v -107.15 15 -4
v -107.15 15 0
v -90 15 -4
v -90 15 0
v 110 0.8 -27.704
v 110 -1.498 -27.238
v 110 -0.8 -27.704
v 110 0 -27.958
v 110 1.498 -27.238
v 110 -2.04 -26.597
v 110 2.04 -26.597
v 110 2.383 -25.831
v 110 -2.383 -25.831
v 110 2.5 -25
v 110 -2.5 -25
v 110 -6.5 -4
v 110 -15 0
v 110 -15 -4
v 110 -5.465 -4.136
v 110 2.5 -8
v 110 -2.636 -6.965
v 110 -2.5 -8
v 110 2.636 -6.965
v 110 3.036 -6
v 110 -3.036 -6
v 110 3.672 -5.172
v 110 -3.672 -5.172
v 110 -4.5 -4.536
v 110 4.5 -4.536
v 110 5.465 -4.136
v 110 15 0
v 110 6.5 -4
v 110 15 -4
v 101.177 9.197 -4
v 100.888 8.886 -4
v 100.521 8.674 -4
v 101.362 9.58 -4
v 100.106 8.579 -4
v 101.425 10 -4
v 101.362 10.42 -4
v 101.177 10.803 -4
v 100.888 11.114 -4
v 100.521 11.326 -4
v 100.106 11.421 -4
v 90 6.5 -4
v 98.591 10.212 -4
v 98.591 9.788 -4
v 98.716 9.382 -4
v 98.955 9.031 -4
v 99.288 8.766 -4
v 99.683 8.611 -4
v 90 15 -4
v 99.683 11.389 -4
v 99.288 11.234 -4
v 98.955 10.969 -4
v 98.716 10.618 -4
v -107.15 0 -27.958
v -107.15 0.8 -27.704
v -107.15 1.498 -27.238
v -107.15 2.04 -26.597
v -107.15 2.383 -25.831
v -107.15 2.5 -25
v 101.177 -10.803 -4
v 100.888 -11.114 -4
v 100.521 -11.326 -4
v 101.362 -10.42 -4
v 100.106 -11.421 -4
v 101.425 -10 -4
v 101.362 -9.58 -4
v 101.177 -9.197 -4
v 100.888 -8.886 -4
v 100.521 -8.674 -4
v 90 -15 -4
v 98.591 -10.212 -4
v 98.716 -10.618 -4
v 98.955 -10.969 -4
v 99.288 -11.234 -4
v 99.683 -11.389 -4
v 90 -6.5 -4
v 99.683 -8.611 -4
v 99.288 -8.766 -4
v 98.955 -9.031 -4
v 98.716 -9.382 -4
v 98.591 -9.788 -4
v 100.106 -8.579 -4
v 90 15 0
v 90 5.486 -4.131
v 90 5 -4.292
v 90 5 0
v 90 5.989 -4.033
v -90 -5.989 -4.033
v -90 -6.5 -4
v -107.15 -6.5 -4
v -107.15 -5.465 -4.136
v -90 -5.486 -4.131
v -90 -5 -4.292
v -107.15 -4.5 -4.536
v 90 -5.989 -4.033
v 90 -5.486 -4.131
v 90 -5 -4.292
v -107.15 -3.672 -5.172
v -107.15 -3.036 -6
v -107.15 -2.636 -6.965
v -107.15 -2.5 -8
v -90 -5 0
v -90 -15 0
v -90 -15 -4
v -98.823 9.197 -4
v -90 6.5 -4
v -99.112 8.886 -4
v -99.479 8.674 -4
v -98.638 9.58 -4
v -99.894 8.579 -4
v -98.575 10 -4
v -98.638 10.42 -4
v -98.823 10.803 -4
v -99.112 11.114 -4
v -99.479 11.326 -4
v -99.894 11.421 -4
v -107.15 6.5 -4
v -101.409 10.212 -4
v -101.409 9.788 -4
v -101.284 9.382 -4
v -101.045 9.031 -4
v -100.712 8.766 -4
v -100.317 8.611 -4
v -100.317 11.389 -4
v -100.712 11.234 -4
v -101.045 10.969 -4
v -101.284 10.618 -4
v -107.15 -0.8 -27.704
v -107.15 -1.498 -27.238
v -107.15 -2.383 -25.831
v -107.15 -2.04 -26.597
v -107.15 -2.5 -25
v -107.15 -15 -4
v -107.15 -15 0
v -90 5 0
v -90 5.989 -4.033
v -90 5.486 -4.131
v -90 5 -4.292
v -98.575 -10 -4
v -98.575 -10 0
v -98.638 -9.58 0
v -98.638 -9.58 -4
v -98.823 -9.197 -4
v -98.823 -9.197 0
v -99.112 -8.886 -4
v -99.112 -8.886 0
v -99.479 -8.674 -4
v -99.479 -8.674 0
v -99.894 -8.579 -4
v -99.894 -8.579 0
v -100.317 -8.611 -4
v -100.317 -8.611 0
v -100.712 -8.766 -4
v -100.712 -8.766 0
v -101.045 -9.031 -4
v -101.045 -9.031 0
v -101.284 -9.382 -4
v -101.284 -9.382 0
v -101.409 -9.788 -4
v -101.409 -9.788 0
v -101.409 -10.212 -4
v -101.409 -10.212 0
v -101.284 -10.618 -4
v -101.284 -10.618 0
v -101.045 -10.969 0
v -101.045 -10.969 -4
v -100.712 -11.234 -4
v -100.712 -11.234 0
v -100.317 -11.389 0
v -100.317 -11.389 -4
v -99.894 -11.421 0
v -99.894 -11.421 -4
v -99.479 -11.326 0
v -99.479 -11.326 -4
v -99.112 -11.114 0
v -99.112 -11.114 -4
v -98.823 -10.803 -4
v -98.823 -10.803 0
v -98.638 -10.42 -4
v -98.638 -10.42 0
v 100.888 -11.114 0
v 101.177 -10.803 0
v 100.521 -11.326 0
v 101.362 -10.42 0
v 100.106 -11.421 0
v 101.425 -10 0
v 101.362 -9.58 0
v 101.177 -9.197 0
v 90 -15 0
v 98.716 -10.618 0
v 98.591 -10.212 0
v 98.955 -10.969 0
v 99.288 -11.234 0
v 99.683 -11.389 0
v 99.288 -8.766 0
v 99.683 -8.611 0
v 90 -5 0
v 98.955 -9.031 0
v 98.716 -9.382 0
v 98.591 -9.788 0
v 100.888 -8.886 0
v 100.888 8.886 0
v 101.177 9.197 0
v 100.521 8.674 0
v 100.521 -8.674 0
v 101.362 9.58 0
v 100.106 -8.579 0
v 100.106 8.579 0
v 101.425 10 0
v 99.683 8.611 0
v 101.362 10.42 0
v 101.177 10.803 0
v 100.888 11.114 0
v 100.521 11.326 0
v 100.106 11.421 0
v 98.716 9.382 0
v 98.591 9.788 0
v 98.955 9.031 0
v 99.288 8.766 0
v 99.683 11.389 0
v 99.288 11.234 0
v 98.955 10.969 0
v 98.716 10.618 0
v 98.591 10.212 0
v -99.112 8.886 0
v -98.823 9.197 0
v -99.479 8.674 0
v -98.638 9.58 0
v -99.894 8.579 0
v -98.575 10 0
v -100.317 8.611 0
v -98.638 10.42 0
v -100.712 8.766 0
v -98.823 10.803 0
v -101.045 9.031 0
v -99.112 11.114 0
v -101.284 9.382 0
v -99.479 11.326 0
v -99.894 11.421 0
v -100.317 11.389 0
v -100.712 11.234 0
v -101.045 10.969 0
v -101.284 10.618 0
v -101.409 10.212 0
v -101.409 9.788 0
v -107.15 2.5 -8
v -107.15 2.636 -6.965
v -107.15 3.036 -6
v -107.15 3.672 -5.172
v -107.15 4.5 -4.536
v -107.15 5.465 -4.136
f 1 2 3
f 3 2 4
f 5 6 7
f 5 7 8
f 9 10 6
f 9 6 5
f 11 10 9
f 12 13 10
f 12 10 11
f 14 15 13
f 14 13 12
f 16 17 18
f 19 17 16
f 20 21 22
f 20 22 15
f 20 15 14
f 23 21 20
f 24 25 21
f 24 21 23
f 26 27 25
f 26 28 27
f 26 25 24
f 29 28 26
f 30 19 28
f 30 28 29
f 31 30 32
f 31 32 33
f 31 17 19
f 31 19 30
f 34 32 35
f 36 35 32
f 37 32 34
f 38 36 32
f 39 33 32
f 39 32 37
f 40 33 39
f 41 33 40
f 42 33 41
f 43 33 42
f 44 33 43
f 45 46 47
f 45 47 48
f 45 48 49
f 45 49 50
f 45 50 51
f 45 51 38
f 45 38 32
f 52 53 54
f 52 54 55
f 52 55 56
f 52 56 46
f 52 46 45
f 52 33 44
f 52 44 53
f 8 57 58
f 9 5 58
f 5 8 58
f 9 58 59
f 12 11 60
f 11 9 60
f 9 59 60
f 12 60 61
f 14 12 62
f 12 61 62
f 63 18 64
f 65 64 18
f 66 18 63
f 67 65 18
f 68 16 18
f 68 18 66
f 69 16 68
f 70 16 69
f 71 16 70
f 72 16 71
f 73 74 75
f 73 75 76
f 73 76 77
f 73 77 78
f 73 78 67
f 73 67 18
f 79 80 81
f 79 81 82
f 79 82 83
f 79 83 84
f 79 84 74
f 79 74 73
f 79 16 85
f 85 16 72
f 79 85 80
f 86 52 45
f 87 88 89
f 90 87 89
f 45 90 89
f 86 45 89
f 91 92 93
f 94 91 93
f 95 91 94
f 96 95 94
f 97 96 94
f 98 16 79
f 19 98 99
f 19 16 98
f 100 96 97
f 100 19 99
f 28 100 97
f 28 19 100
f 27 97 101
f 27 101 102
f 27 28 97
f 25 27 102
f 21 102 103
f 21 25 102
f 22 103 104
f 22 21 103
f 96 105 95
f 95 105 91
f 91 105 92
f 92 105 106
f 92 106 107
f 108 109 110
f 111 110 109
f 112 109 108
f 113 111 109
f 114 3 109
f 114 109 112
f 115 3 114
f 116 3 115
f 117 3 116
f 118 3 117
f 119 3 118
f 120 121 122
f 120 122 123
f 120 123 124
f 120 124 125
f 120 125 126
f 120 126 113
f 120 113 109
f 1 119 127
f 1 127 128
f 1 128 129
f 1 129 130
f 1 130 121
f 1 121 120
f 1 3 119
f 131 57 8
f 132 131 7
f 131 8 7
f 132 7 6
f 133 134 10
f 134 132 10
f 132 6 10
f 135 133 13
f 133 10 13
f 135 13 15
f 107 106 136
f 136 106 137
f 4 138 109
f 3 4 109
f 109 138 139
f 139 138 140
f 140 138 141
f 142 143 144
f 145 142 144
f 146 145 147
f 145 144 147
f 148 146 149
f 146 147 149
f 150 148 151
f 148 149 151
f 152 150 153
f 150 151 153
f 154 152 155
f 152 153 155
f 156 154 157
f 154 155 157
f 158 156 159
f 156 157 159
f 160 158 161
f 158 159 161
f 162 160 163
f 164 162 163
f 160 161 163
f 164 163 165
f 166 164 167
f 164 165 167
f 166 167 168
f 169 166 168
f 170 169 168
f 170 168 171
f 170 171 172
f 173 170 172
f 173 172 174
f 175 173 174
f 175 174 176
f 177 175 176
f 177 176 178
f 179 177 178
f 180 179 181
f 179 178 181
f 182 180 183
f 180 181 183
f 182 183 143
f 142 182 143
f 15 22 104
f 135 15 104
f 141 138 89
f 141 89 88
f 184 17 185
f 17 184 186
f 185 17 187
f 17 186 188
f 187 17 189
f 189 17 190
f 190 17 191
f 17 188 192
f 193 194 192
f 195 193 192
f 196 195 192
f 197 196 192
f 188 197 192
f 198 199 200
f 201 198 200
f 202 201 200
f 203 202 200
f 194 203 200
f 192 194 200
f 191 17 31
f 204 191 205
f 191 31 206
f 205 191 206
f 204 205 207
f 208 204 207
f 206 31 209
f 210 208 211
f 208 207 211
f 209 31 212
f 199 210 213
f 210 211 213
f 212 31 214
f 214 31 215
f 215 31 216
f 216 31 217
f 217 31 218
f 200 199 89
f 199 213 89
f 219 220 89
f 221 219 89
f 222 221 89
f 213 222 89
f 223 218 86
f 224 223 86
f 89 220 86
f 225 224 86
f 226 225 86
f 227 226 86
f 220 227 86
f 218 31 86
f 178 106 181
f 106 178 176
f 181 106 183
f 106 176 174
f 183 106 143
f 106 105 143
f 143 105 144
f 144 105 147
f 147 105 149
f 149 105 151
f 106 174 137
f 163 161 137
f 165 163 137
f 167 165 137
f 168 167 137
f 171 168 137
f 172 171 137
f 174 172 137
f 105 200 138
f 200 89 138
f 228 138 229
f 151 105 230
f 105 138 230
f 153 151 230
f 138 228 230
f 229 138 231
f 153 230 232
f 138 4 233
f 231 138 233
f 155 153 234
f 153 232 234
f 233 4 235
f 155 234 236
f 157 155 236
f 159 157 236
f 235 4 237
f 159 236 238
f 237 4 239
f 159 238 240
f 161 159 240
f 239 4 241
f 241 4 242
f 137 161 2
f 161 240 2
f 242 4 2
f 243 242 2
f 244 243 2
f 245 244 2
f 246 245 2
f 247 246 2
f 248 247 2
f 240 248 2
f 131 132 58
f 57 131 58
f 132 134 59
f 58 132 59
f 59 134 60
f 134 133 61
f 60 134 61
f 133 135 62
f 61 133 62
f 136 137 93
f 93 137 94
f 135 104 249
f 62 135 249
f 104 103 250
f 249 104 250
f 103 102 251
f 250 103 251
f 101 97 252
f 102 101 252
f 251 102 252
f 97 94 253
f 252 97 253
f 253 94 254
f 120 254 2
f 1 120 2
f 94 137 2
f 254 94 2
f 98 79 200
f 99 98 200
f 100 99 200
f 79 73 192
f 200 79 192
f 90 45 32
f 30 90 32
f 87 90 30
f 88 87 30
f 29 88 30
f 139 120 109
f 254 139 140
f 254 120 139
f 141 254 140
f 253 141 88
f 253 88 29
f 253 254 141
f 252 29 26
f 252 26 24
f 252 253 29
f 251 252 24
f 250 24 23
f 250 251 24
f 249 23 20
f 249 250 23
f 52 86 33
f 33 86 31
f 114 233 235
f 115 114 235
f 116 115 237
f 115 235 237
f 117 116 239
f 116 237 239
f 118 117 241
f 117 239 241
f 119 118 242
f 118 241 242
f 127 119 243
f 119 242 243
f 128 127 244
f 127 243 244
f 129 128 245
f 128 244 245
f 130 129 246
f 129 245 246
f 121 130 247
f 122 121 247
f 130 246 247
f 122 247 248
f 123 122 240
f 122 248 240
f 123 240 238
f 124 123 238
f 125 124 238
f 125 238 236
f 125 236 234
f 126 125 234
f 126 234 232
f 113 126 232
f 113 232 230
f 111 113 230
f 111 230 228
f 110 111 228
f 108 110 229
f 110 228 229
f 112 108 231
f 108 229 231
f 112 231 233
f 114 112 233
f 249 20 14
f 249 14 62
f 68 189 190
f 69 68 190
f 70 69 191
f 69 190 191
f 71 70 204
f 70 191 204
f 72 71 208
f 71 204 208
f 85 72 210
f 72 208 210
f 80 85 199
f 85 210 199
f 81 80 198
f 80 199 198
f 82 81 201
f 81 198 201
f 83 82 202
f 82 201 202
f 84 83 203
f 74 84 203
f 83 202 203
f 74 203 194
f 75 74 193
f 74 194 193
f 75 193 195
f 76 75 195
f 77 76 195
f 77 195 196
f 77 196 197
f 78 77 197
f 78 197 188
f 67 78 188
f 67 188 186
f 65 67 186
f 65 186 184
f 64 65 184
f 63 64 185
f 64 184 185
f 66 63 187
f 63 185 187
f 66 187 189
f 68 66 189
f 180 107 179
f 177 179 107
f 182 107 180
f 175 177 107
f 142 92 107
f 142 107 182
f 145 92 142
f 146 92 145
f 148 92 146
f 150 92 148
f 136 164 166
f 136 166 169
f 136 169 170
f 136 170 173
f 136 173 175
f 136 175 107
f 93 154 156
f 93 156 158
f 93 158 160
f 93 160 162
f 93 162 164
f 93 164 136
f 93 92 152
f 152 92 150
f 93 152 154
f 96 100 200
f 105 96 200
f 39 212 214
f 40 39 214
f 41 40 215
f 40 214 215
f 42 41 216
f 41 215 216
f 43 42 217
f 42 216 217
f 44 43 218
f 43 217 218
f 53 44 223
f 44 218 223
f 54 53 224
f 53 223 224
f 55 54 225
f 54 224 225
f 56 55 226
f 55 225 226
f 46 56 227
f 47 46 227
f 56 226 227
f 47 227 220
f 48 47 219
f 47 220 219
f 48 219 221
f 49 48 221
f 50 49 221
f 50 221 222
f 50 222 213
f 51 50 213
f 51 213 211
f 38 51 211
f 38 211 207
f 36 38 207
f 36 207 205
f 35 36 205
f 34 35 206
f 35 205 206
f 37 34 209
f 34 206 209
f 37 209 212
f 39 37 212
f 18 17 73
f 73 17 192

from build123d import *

# Parameters (mm, degrees)
SKETCH1_R           = 1.425
BOSS_EXTRUDE1_DEPTH = 4
SKETCH2_W           = 217.15
SKETCH2_H           = 5
BOSS_EXTRUDE2_DEPTH = 24
FILLET1_R           = 4
FILLET2_R           = 3


with BuildPart() as part:
    # Sketch1 → Boss-Extrude1 (new body)
    with BuildSketch(Plane.XY):
        Polygon((110, -15), (90, -15), (90, -5), (-90, -5), (-90, -15), (-107.15, -15), (-107.15, 15), (-90, 15), (-90, 5), (90, 5), (90, 15), (110, 15), align=None)
        with Locations((100, 10)):
            Circle(SKETCH1_R, mode=Mode.SUBTRACT)
        with Locations((100, -10)):
            Circle(SKETCH1_R, mode=Mode.SUBTRACT)
        with Locations((-100, -10)):
            Circle(SKETCH1_R, mode=Mode.SUBTRACT)
        with Locations((-100, 10)):
            Circle(SKETCH1_R, mode=Mode.SUBTRACT)
    extrude(amount=-BOSS_EXTRUDE1_DEPTH)

    # Sketch2 → Boss-Extrude2 (add)
    with BuildSketch(Plane(origin=(0, 0, -4), x_dir=(-1, 0, 0), z_dir=(0, 0, -1))):
        with Locations((-1.425, 0)):
            Rectangle(SKETCH2_W, SKETCH2_H)
    extrude(amount=BOSS_EXTRUDE2_DEPTH)

    # Fillet1
    # the kernel refuses this fillet: 4 mm, written as the material it adds along each edge
    with BuildSketch(Plane(origin=(-107.15, 2.5, -4), x_dir=(0, 1, 0), z_dir=(1, 0, 0))) as fillet1_piece_1_section:
        with BuildLine():
            CenterArc((FILLET1_R, -FILLET1_R), FILLET1_R, 90, 90)
            Line((0, -FILLET1_R), (0, 0))
            Line((0, 0), (FILLET1_R, 0))
        make_face()
    fillet1_piece_1 = extrude(amount=217.15, mode=Mode.PRIVATE)
    fillet1_piece_1 = split(fillet1_piece_1, bisect_by=Plane(origin=(-98.575, 5, -4.029214959), z_dir=(0, 1, 0)), keep=Keep.TOP, mode=Mode.PRIVATE)
    fillet1_piece_1 = split(fillet1_piece_1, bisect_by=Plane(origin=(-90, 5.544093945, -4.029214959), z_dir=(-1, 0, 0)), keep=Keep.TOP, mode=Mode.PRIVATE)
    add(fillet1_piece_1)
    with BuildSketch(Plane(origin=(-107.15, 2.5, -4), x_dir=(0, 1, 0), z_dir=(1, 0, 0))) as fillet1_piece_2_section:
        with BuildLine():
            CenterArc((FILLET1_R, -FILLET1_R), FILLET1_R, 90, 90)
            Line((0, -FILLET1_R), (0, 0))
            Line((0, 0), (FILLET1_R, 0))
        make_face()
    fillet1_piece_2 = extrude(amount=217.15, mode=Mode.PRIVATE)
    fillet1_piece_2 = split(fillet1_piece_2, bisect_by=Plane(origin=(-98.575, 5, -4.966148005), z_dir=(0, -1, 0)), keep=Keep.TOP, mode=Mode.PRIVATE)
    fillet1_piece_2 = split(fillet1_piece_2, bisect_by=Plane(origin=(-90, 3.257783084, -4.966148005), z_dir=(-1, 0, 0)), keep=Keep.TOP, mode=Mode.PRIVATE)
    add(fillet1_piece_2)
    with BuildSketch(Plane(origin=(-107.15, 2.5, -4), x_dir=(0, 1, 0), z_dir=(1, 0, 0))) as fillet1_piece_3_section:
        with BuildLine():
            CenterArc((FILLET1_R, -FILLET1_R), FILLET1_R, 90, 90)
            Line((0, -FILLET1_R), (0, 0))
            Line((0, 0), (FILLET1_R, 0))
        make_face()
    fillet1_piece_3 = extrude(amount=217.15, mode=Mode.PRIVATE)
    fillet1_piece_3 = split(fillet1_piece_3, bisect_by=Plane(origin=(90, 3.257783084, -4.966148005), z_dir=(-1, 0, 0)), keep=Keep.TOP, mode=Mode.PRIVATE)
    fillet1_piece_3 = split(fillet1_piece_3, bisect_by=Plane(origin=(0, 5, -4.966148005), z_dir=(0, -1, 0)), keep=Keep.TOP, mode=Mode.PRIVATE)
    fillet1_piece_3 = split(fillet1_piece_3, bisect_by=Plane(origin=(-90, 3.257783084, -4.966148005), z_dir=(1, 0, 0)), keep=Keep.TOP, mode=Mode.PRIVATE)
    add(fillet1_piece_3)
    with BuildSketch(Plane(origin=(-107.15, 2.5, -4), x_dir=(0, 1, 0), z_dir=(1, 0, 0))) as fillet1_piece_4_section:
        with BuildLine():
            CenterArc((FILLET1_R, -FILLET1_R), FILLET1_R, 90, 90)
            Line((0, -FILLET1_R), (0, 0))
            Line((0, 0), (FILLET1_R, 0))
        make_face()
    fillet1_piece_4 = extrude(amount=217.15, mode=Mode.PRIVATE)
    fillet1_piece_4 = split(fillet1_piece_4, bisect_by=Plane(origin=(90, 5.544093945, -4.029214959), z_dir=(1, 0, 0)), keep=Keep.TOP, mode=Mode.PRIVATE)
    fillet1_piece_4 = split(fillet1_piece_4, bisect_by=Plane(origin=(100, 5, -4.029214959), z_dir=(0, 1, 0)), keep=Keep.TOP, mode=Mode.PRIVATE)
    add(fillet1_piece_4)
    with BuildSketch(Plane(origin=(-107.15, 2.5, -4), x_dir=(0, 1, 0), z_dir=(1, 0, 0))) as fillet1_piece_5_section:
        with BuildLine():
            CenterArc((FILLET1_R, -FILLET1_R), FILLET1_R, 90, 90)
            Line((0, -FILLET1_R), (0, 0))
            Line((0, 0), (FILLET1_R, 0))
        make_face()
    fillet1_piece_5 = extrude(amount=217.15, mode=Mode.PRIVATE)
    fillet1_piece_5 = split(fillet1_piece_5, bisect_by=Plane(origin=(90, 3.257783084, -4.966148005), z_dir=(1, 0, 0)), keep=Keep.TOP, mode=Mode.PRIVATE)
    fillet1_piece_5 = split(fillet1_piece_5, bisect_by=Plane(origin=(100, 5, -4.966148005), z_dir=(0, -1, 0)), keep=Keep.TOP, mode=Mode.PRIVATE)
    add(fillet1_piece_5)
    with BuildSketch(Plane(origin=(110, -2.5, -4), x_dir=(0, -1, 0), z_dir=(-1, 0, 0))) as fillet1_piece_6_section:
        with BuildLine():
            CenterArc((FILLET1_R, -FILLET1_R), FILLET1_R, 90, 90)
            Line((0, -FILLET1_R), (0, 0))
            Line((0, 0), (FILLET1_R, 0))
        make_face()
    fillet1_piece_6 = extrude(amount=217.15, mode=Mode.PRIVATE)
    fillet1_piece_6 = split(fillet1_piece_6, bisect_by=Plane(origin=(90, -5.544093945, -4.029214959), z_dir=(1, 0, 0)), keep=Keep.TOP, mode=Mode.PRIVATE)
    fillet1_piece_6 = split(fillet1_piece_6, bisect_by=Plane(origin=(100, -5, -4.029214959), z_dir=(0, -1, 0)), keep=Keep.TOP, mode=Mode.PRIVATE)
    add(fillet1_piece_6)
    with BuildSketch(Plane(origin=(110, -2.5, -4), x_dir=(0, -1, 0), z_dir=(-1, 0, 0))) as fillet1_piece_7_section:
        with BuildLine():
            CenterArc((FILLET1_R, -FILLET1_R), FILLET1_R, 90, 90)
            Line((0, -FILLET1_R), (0, 0))
            Line((0, 0), (FILLET1_R, 0))
        make_face()
    fillet1_piece_7 = extrude(amount=217.15, mode=Mode.PRIVATE)
    fillet1_piece_7 = split(fillet1_piece_7, bisect_by=Plane(origin=(90, -3.257783084, -4.966148005), z_dir=(1, 0, 0)), keep=Keep.TOP, mode=Mode.PRIVATE)
    fillet1_piece_7 = split(fillet1_piece_7, bisect_by=Plane(origin=(100, -5, -4.966148005), z_dir=(0, 1, 0)), keep=Keep.TOP, mode=Mode.PRIVATE)
    add(fillet1_piece_7)
    with BuildSketch(Plane(origin=(110, -2.5, -4), x_dir=(0, -1, 0), z_dir=(-1, 0, 0))) as fillet1_piece_8_section:
        with BuildLine():
            CenterArc((FILLET1_R, -FILLET1_R), FILLET1_R, 90, 90)
            Line((0, -FILLET1_R), (0, 0))
            Line((0, 0), (FILLET1_R, 0))
        make_face()
    fillet1_piece_8 = extrude(amount=217.15, mode=Mode.PRIVATE)
    fillet1_piece_8 = split(fillet1_piece_8, bisect_by=Plane(origin=(90, -3.257783084, -4.966148005), z_dir=(-1, 0, 0)), keep=Keep.TOP, mode=Mode.PRIVATE)
    fillet1_piece_8 = split(fillet1_piece_8, bisect_by=Plane(origin=(-90, -3.257783084, -4.966148005), z_dir=(1, 0, 0)), keep=Keep.TOP, mode=Mode.PRIVATE)
    fillet1_piece_8 = split(fillet1_piece_8, bisect_by=Plane(origin=(0, -5, -4.966148005), z_dir=(0, 1, 0)), keep=Keep.TOP, mode=Mode.PRIVATE)
    add(fillet1_piece_8)
    with BuildSketch(Plane(origin=(110, -2.5, -4), x_dir=(0, -1, 0), z_dir=(-1, 0, 0))) as fillet1_piece_9_section:
        with BuildLine():
            CenterArc((FILLET1_R, -FILLET1_R), FILLET1_R, 90, 90)
            Line((0, -FILLET1_R), (0, 0))
            Line((0, 0), (FILLET1_R, 0))
        make_face()
    fillet1_piece_9 = extrude(amount=217.15, mode=Mode.PRIVATE)
    fillet1_piece_9 = split(fillet1_piece_9, bisect_by=Plane(origin=(-90, -5.544093945, -4.029214959), z_dir=(-1, 0, 0)), keep=Keep.TOP, mode=Mode.PRIVATE)
    fillet1_piece_9 = split(fillet1_piece_9, bisect_by=Plane(origin=(-98.575, -5, -4.029214959), z_dir=(0, -1, 0)), keep=Keep.TOP, mode=Mode.PRIVATE)
    add(fillet1_piece_9)
    with BuildSketch(Plane(origin=(110, -2.5, -4), x_dir=(0, -1, 0), z_dir=(-1, 0, 0))) as fillet1_piece_10_section:
        with BuildLine():
            CenterArc((FILLET1_R, -FILLET1_R), FILLET1_R, 90, 90)
            Line((0, -FILLET1_R), (0, 0))
            Line((0, 0), (FILLET1_R, 0))
        make_face()
    fillet1_piece_10 = extrude(amount=217.15, mode=Mode.PRIVATE)
    fillet1_piece_10 = split(fillet1_piece_10, bisect_by=Plane(origin=(-90, -3.257783084, -4.966148005), z_dir=(-1, 0, 0)), keep=Keep.TOP, mode=Mode.PRIVATE)
    fillet1_piece_10 = split(fillet1_piece_10, bisect_by=Plane(origin=(-98.575, -5, -4.966148005), z_dir=(0, 1, 0)), keep=Keep.TOP, mode=Mode.PRIVATE)
    add(fillet1_piece_10)

    # Fillet2
    # the kernel refuses this fillet: 3 mm, written as the material it takes off along each edge
    with BuildSketch(Plane(origin=(117.5, -2.5, -28), x_dir=(0, 1, 0), z_dir=(-1, 0, 0))) as fillet2_piece_1:
        with BuildLine():
            CenterArc((FILLET2_R, -FILLET2_R), FILLET2_R, 90, 90)
            Line((0, -FILLET2_R), (0, 0))
            Line((0, 0), (FILLET2_R, 0))
        make_face()
    extrude(amount=232.15, mode=Mode.SUBTRACT)
    with BuildSketch(Plane(origin=(-114.65, 2.5, -28), x_dir=(0, 0, 1), z_dir=(1, 0, 0))) as fillet2_piece_2:
        with BuildLine():
            CenterArc((FILLET2_R, FILLET2_R), FILLET2_R, 180, 90)
            Line((0, FILLET2_R), (0, 0))
            Line((0, 0), (FILLET2_R, 0))
        make_face()
    extrude(amount=232.15, mode=Mode.SUBTRACT)


solid = part.part
